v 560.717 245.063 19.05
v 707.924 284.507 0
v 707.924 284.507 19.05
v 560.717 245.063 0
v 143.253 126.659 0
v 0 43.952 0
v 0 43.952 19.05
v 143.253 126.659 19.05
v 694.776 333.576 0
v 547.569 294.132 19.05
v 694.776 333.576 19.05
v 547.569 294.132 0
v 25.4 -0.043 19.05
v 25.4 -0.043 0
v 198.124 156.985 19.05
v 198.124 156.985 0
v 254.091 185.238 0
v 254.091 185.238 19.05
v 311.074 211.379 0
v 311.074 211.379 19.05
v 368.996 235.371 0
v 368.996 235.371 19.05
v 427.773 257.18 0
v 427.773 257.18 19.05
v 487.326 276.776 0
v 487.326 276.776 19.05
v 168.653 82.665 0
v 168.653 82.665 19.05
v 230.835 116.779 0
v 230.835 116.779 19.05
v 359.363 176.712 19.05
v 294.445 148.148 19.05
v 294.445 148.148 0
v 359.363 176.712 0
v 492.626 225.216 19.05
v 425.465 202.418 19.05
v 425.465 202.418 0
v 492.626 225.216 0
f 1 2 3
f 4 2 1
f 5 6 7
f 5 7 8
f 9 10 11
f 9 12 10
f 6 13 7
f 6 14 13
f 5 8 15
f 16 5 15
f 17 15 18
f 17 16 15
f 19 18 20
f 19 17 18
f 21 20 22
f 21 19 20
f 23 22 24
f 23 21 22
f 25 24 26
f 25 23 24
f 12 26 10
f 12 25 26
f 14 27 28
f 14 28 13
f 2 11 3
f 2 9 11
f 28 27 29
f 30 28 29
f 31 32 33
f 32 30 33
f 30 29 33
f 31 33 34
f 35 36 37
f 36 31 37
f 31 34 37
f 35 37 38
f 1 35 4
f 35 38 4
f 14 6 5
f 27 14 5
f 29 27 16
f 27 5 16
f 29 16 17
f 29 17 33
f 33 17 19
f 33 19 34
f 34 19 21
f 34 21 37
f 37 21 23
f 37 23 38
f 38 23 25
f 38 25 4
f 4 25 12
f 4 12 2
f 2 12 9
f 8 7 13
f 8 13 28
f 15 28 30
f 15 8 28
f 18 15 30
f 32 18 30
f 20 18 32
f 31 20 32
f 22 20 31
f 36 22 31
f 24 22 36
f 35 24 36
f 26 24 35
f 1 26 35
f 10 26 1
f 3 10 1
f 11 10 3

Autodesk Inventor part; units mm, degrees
ref_plane "YZ Plane" through (0, 0, 0) normal (1, 0, 0) x (0, 1, 0)
ref_plane "XZ Plane" through (0, 0, 0) normal (0, 1, 0) x (-1, 0, 0)
ref_plane "XY Plane" through (0, 0, 0) normal (0, 0, 1) x (1, 0, 0)
sketch "Sketch1" plane through (0, 0, 0) normal (0, 0, 1) x (1, 0, 0)
  line L0 (707.9241, 284.5068) -> (560.717, 245.0627)
  arc A0 (560.717, 245.0627) -> (168.6533, 82.6646) centre (981.4533, -1325.1463) ccw
  line L1 (168.6533, 82.6646) -> (25.4001, -0.0426)
  line L2 (25.4001, -0.0426) -> (0.0001, 43.9515)
  line L3 (0.0001, 43.9515) -> (143.2533, 126.6587)
  arc A1 (547.569, 294.1318) -> (143.2533, 126.6587) centre (981.4533, -1325.1463) ccw
  line L4 (547.569, 294.1318) -> (694.7761, 333.5758)
  line L5 (694.7761, 333.5758) -> (707.9241, 284.5068)
  point P0 (0, 0)
extrude "Extrusion1" add sketch "Sketch1" along normal blind 19.05
properties part number "nd-o"
